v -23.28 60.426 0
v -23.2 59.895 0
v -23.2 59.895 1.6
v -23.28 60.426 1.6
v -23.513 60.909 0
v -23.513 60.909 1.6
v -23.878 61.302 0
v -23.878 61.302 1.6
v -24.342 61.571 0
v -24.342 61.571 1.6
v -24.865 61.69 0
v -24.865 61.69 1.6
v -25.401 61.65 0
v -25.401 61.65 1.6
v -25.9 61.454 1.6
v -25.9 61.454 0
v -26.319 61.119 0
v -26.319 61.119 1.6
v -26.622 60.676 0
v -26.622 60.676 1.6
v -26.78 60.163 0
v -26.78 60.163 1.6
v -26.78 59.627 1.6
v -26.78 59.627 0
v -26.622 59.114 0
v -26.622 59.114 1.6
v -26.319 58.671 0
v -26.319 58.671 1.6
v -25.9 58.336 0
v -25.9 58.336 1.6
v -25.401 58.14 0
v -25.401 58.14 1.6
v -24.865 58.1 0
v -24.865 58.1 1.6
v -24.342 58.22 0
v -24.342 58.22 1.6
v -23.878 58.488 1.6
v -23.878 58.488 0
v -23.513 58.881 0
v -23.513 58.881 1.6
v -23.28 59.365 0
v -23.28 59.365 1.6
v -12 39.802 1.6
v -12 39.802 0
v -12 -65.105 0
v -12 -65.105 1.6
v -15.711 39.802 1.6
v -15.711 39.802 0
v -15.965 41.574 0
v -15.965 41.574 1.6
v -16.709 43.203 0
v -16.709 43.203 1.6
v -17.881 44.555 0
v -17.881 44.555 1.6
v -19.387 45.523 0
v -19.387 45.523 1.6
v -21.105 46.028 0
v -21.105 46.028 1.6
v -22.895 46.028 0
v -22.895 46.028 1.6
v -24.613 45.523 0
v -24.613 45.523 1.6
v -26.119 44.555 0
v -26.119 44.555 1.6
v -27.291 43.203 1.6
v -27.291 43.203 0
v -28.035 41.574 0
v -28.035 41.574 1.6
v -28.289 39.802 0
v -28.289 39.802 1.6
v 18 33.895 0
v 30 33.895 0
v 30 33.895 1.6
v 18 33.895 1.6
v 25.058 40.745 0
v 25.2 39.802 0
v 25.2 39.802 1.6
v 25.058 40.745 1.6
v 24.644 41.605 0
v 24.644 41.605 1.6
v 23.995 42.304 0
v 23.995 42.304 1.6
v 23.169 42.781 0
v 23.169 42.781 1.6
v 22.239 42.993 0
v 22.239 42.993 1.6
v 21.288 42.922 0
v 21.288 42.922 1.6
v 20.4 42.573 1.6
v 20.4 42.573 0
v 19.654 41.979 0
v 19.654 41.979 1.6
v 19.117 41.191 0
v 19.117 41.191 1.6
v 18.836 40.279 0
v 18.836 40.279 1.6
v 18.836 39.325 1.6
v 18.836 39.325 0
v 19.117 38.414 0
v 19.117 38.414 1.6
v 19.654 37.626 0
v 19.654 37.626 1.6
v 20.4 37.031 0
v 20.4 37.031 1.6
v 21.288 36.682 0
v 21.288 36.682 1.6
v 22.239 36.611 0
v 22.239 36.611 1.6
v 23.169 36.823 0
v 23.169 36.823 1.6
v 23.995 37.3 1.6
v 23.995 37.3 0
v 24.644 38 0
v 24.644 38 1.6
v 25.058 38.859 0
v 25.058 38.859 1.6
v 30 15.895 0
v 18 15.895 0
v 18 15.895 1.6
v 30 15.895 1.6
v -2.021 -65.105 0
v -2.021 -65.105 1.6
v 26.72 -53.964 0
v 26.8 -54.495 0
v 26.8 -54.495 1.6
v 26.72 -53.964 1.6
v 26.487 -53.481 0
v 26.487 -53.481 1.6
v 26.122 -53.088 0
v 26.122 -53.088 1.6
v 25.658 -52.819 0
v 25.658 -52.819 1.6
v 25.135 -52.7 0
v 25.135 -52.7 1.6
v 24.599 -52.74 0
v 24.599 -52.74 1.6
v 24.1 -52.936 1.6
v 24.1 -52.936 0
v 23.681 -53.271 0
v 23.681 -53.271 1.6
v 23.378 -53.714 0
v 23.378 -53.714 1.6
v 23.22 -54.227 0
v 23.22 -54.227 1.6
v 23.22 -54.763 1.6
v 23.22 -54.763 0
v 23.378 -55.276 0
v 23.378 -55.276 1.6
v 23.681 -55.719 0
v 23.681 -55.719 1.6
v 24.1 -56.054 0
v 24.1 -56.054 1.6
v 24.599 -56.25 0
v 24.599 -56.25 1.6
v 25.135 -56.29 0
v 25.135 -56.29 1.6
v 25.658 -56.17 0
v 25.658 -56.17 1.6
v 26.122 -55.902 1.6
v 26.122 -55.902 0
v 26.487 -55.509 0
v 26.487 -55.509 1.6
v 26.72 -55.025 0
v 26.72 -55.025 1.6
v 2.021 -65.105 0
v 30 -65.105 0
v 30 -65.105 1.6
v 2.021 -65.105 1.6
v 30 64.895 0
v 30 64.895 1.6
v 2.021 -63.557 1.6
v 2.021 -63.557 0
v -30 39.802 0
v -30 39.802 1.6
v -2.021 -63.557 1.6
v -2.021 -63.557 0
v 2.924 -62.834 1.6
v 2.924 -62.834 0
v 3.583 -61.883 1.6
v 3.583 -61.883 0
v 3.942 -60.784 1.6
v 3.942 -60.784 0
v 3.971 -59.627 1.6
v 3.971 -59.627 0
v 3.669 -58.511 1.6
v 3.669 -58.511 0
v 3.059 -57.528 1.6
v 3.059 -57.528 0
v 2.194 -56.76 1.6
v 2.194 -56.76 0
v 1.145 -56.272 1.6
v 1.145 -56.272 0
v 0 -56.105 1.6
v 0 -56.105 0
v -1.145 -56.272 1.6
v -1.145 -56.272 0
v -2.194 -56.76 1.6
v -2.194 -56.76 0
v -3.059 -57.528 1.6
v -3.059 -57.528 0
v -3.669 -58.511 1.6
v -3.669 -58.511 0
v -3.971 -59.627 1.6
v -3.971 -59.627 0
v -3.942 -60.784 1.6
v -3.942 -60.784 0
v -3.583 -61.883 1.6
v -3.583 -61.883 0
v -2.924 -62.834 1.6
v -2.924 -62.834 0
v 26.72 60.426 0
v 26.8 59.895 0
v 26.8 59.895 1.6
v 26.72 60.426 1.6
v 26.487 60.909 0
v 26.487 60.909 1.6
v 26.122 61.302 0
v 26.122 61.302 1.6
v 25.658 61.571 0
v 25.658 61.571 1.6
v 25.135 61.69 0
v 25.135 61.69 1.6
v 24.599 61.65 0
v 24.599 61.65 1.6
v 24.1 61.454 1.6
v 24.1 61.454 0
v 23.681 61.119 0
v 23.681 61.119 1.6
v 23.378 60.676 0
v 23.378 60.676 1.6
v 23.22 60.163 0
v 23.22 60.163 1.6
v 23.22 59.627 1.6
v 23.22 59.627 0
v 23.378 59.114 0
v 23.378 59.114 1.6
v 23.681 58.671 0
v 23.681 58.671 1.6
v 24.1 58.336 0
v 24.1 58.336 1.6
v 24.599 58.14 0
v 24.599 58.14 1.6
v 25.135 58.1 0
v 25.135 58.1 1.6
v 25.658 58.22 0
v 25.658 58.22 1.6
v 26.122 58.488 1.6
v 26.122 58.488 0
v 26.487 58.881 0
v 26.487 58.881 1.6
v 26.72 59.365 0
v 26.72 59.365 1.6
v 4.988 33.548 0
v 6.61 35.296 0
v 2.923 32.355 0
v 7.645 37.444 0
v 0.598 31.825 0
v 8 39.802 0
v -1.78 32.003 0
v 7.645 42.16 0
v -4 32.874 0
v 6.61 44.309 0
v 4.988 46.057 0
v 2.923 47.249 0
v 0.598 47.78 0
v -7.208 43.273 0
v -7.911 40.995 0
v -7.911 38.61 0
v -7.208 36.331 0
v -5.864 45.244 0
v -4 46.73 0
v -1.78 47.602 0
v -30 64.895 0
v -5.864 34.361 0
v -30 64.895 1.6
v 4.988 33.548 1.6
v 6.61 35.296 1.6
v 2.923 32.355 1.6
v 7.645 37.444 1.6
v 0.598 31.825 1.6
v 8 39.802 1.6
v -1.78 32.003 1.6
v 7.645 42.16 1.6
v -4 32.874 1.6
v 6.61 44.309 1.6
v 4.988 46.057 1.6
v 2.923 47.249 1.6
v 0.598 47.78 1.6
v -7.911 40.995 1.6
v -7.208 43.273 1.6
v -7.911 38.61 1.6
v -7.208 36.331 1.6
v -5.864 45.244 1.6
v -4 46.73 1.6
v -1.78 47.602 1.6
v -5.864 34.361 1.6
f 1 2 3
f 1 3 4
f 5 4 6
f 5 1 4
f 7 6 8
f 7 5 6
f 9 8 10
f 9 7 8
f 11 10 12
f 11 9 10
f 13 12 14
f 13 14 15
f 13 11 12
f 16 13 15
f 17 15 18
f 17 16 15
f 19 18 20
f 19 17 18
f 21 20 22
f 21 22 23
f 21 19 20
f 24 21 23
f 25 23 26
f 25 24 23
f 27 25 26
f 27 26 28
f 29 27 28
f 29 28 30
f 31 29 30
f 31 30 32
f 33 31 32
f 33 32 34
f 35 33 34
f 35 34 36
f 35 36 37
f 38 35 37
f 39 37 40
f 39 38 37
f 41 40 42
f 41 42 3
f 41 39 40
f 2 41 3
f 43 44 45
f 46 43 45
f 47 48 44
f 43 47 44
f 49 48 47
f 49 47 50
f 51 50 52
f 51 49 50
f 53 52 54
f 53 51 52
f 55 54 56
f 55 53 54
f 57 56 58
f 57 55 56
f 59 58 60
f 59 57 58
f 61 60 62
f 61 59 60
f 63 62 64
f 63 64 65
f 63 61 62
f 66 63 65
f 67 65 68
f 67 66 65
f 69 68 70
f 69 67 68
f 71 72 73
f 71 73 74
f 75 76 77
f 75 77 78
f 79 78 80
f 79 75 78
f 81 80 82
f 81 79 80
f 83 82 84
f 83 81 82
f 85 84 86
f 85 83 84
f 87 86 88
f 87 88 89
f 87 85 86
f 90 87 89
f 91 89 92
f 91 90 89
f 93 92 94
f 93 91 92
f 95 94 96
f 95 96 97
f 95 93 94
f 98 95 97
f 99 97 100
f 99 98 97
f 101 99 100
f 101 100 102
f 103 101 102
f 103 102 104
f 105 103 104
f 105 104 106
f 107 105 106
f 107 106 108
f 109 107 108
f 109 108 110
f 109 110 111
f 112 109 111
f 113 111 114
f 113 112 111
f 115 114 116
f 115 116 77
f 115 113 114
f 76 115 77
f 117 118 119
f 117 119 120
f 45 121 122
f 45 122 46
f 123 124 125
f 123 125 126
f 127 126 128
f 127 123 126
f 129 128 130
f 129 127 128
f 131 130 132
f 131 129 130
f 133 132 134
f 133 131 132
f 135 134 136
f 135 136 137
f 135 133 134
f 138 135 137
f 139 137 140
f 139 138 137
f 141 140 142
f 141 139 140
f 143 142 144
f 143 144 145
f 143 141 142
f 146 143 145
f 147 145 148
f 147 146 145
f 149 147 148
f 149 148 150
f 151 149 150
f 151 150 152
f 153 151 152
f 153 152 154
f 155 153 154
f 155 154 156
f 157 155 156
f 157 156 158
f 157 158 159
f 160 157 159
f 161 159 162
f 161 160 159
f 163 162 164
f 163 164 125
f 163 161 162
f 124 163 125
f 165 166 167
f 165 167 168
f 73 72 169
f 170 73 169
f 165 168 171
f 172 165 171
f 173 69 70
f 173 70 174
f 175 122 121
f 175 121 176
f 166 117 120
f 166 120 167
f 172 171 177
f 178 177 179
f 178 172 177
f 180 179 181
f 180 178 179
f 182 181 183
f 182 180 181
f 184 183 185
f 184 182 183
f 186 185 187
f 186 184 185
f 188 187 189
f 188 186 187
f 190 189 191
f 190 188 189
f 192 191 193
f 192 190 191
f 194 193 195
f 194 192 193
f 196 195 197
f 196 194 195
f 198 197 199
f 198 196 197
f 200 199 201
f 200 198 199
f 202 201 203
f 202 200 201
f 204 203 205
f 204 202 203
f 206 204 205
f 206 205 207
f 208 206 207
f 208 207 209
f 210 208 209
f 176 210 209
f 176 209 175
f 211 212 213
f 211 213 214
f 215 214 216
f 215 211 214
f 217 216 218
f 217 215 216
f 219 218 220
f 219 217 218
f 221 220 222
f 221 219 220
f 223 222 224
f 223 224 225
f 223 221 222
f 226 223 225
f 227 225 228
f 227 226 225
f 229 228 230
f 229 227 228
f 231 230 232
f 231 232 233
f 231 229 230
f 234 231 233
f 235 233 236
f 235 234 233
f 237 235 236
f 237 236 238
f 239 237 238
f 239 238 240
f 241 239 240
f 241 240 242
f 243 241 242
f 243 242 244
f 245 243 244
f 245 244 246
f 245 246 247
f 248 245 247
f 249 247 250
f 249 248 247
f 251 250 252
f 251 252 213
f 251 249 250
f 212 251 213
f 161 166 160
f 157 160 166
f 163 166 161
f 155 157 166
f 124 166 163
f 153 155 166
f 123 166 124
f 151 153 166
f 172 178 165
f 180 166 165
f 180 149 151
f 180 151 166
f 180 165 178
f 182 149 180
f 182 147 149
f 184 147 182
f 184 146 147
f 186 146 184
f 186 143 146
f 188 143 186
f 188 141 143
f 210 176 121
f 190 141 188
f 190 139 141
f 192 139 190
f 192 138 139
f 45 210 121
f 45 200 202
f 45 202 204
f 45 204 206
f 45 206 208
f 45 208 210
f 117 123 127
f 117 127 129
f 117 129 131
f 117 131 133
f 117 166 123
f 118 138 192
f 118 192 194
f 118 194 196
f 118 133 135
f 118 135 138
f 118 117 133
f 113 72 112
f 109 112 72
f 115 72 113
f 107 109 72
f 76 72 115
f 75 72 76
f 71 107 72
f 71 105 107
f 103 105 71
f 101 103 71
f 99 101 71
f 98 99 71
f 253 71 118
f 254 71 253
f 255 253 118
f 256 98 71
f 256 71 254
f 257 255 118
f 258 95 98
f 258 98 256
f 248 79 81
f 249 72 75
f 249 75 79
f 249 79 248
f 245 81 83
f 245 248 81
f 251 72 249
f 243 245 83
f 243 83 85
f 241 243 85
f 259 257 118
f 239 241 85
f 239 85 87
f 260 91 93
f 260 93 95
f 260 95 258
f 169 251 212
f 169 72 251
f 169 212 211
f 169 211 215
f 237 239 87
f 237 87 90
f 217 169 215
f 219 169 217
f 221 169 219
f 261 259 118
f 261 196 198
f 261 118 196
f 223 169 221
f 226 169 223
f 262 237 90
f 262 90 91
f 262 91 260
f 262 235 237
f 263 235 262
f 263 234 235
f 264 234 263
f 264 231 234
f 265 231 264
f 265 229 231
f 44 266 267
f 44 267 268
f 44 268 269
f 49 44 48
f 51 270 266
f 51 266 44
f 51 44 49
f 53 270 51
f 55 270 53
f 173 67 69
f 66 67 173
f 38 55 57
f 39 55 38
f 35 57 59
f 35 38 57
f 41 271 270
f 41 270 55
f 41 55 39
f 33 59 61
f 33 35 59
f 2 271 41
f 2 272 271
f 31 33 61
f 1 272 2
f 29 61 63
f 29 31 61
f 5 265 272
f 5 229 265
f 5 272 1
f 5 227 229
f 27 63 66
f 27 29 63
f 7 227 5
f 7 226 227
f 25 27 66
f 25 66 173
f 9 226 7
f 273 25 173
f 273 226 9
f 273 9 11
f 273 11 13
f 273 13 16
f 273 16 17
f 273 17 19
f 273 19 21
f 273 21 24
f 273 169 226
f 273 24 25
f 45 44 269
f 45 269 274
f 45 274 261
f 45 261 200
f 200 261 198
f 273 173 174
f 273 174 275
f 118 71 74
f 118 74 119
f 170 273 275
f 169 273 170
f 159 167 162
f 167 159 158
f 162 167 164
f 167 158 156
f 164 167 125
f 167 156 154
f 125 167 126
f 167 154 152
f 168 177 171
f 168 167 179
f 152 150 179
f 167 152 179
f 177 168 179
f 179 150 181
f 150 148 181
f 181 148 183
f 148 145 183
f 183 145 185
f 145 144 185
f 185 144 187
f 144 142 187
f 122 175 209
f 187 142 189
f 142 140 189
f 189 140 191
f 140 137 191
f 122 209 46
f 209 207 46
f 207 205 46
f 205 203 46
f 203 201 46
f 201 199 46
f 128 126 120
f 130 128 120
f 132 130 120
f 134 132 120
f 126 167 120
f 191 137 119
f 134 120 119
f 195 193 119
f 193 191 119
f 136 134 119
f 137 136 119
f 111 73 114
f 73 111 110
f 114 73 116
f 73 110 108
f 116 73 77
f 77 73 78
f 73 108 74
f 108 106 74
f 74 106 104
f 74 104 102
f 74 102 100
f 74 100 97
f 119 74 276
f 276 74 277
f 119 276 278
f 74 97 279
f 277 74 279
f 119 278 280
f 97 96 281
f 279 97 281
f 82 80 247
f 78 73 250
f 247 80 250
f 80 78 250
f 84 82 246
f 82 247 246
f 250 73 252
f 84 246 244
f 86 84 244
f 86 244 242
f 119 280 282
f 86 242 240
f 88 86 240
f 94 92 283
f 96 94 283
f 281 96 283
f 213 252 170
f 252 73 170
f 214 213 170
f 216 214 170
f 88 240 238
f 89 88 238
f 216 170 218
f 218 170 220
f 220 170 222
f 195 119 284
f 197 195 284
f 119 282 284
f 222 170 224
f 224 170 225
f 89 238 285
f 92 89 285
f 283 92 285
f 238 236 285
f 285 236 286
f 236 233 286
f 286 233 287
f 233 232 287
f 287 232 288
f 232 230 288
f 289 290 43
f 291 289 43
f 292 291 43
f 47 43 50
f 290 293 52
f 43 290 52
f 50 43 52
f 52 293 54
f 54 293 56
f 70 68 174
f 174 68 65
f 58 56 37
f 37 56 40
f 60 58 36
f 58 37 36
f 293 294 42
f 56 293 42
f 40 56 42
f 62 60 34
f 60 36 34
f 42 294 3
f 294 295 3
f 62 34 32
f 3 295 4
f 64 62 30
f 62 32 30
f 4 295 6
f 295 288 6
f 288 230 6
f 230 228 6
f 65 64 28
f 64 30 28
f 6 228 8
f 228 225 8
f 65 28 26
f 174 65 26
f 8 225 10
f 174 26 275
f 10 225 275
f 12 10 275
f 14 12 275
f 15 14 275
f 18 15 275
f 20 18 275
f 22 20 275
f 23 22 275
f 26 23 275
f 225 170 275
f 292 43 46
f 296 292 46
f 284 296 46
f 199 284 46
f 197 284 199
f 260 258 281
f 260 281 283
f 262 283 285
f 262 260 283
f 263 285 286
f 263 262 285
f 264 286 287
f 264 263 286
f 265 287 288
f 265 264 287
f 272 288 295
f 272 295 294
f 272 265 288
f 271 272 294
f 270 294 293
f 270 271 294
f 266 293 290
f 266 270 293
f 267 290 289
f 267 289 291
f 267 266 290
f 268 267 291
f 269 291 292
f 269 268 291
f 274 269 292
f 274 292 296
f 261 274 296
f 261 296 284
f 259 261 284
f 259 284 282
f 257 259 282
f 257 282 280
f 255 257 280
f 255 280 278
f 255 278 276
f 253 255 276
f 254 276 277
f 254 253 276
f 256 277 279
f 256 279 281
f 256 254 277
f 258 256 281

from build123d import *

# Parameters (mm, degrees)
SKETCH_R     = 8
SKETCH_R_2   = 3.2
SKETCH_R_3   = 4
SKETCH_R_4   = 1.8
PAD_DEPTH    = 1.6
SKETCH001_W  = 4.041902
SKETCH001_H  = 2.18935
POCKET_DEPTH = 5


with BuildPart() as part:
    # Sketch → Pad (new body)
    with BuildSketch(Plane.XY):
        with BuildLine():
            ThreePointArc((-15.710509, 39.802188), (-22, 46.091679), (-28.289491, 39.802188))
            Line((-28.289491, 39.802188), (-30, 39.802188))
            Line((-30, 39.802188), (-30, 64.895162))
            Line((-30, 64.895162), (30, 64.895162))
            Line((30, 33.895162), (30, 64.895162))
            Line((30, 33.895162), (18, 33.895162))
            Line((18, 33.895162), (18, 15.895162))
            Line((18, 15.895162), (30, 15.895162))
            Line((30, 15.895162), (30, -65.104838))
            Line((30, -65.104838), (-12, -65.104838))
            Line((-12, -49.414836), (-12, -65.104838))
            Line((-12, -8.197812), (-12, -49.414836))
            Line((-12, 39.802188), (-12, -8.197812))
            Line((-15.710509, 39.802188), (-12, 39.802188))
        make_face()
        with Locations((0, 39.802188)):
            Circle(SKETCH_R, mode=Mode.SUBTRACT)
        with Locations((22, 39.802188)):
            Circle(SKETCH_R_2, mode=Mode.SUBTRACT)
        with Locations((0, -60.104838)):
            Circle(SKETCH_R_3, mode=Mode.SUBTRACT)
        with Locations((25, -54.494838)):
            Circle(SKETCH_R_4, mode=Mode.SUBTRACT)
        with Locations((25, 59.895164)):
            Circle(SKETCH_R_4, mode=Mode.SUBTRACT)
        with Locations((-25, 59.895162)):
            Circle(SKETCH_R_4, mode=Mode.SUBTRACT)
    extrude(amount=PAD_DEPTH)

    # Sketch001 (on Face22 of Pad) → Pocket (cut)
    with BuildSketch(Plane.XY.offset(1.6)):
        with Locations((0, -64.491804)):
            Rectangle(SKETCH001_W, SKETCH001_H)
    extrude(amount=-POCKET_DEPTH, mode=Mode.SUBTRACT)


solid = part.part
